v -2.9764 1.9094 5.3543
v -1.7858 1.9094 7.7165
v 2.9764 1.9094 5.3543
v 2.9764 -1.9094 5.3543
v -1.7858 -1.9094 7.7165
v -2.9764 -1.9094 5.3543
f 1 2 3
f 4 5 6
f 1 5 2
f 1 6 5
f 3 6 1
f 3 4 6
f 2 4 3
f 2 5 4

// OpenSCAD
// file: RA12131100.scad
w_body = 18.9;
h_body = 12.0;
d_body = 11.6;

w_top = 21.0;
h_top = 15.0;
d_top = 2.0;

w_switch = w_body * 0.8;
h_switch = 9.7;
d_switch = 6.0;

w_lug = 0.8;
h_lug = 3.1;
d_lug = 5.8;

lug_distance = 7.0;
lug_base_widen = 1.5;

lug_base_hole_pos = 1.0;
lug_hole_d = 1.5;
lug_hole_tall_d = 2.3;

module body() {
  translate([-w_body/2, -h_body/2])
  cube([w_body, h_body, d_body]);

  translate([-w_top/2, -h_top/2, d_body])
  cube([w_top, h_top, d_top]);
}

module switch() {
  translate([-w_switch/2, 0, d_top + d_body])
  rotate([90, 0, 0])
  linear_extrude(h_switch, center=true)
  polygon([
    [0, 0],
    [w_switch, 0],
    [w_switch*0.2, d_switch]
  ]);
}

module lug() {
  module lug_body() {
    union() {
      translate([-h_lug/2, 0])
      square([h_lug, d_lug-h_lug/2]);

      translate([-(h_lug + lug_base_widen)/2, 0])
      square([(h_lug + lug_base_widen), 0.5]);

      translate([0, d_lug-h_lug/2])
      resize([h_lug, h_lug])
      circle(5);
    }  
  }
  
  module lug_hole() {
    resize([lug_hole_d, lug_hole_d])
    circle(5);
  }
  module lug_hole_tall() {
    rotate([0, 0, 180])
    union() {      
      lug_hole();    
      translate([0, lug_hole_tall_d-lug_hole_d])    
      lug_hole();
      translate([-lug_hole_d/2, 0])
      square([lug_hole_d, lug_hole_tall_d-lug_hole_d]);
    }
  }
  
  rotate([-90, 0, 90])
  linear_extrude(w_lug, center=true)
  difference() {
    lug_body();
    translate([0, lug_base_hole_pos])
    lug_hole();
    translate([0, d_lug-h_lug/2])
    lug_hole_tall();
  }
}

module lugs() {
  lug();

  translate([lug_distance, 0])
  lug();
}

module ra12131100() {
  color([0.2, 0.2, 0.2])
  body();

  color([0.2, 0.2, 0.2])
  switch();

  color([0.8, 0.8, 0.8])
  lugs();
}
// file: ../openscad/utils.scad
module copy_mirror(vec=[0, 1, 0]) {
  children();

  mirror(vec)
  children();
}

module scale_to_kicad_inches() {
  scale([1/2.54, 1/2.54, 1/2.54])
  children();
}
// main file
use <../openscad/utils.scad>;
use <RA12131100.scad>

scale_to_kicad_inches()
color([0.2, 0.2, 0.2])
switch();
